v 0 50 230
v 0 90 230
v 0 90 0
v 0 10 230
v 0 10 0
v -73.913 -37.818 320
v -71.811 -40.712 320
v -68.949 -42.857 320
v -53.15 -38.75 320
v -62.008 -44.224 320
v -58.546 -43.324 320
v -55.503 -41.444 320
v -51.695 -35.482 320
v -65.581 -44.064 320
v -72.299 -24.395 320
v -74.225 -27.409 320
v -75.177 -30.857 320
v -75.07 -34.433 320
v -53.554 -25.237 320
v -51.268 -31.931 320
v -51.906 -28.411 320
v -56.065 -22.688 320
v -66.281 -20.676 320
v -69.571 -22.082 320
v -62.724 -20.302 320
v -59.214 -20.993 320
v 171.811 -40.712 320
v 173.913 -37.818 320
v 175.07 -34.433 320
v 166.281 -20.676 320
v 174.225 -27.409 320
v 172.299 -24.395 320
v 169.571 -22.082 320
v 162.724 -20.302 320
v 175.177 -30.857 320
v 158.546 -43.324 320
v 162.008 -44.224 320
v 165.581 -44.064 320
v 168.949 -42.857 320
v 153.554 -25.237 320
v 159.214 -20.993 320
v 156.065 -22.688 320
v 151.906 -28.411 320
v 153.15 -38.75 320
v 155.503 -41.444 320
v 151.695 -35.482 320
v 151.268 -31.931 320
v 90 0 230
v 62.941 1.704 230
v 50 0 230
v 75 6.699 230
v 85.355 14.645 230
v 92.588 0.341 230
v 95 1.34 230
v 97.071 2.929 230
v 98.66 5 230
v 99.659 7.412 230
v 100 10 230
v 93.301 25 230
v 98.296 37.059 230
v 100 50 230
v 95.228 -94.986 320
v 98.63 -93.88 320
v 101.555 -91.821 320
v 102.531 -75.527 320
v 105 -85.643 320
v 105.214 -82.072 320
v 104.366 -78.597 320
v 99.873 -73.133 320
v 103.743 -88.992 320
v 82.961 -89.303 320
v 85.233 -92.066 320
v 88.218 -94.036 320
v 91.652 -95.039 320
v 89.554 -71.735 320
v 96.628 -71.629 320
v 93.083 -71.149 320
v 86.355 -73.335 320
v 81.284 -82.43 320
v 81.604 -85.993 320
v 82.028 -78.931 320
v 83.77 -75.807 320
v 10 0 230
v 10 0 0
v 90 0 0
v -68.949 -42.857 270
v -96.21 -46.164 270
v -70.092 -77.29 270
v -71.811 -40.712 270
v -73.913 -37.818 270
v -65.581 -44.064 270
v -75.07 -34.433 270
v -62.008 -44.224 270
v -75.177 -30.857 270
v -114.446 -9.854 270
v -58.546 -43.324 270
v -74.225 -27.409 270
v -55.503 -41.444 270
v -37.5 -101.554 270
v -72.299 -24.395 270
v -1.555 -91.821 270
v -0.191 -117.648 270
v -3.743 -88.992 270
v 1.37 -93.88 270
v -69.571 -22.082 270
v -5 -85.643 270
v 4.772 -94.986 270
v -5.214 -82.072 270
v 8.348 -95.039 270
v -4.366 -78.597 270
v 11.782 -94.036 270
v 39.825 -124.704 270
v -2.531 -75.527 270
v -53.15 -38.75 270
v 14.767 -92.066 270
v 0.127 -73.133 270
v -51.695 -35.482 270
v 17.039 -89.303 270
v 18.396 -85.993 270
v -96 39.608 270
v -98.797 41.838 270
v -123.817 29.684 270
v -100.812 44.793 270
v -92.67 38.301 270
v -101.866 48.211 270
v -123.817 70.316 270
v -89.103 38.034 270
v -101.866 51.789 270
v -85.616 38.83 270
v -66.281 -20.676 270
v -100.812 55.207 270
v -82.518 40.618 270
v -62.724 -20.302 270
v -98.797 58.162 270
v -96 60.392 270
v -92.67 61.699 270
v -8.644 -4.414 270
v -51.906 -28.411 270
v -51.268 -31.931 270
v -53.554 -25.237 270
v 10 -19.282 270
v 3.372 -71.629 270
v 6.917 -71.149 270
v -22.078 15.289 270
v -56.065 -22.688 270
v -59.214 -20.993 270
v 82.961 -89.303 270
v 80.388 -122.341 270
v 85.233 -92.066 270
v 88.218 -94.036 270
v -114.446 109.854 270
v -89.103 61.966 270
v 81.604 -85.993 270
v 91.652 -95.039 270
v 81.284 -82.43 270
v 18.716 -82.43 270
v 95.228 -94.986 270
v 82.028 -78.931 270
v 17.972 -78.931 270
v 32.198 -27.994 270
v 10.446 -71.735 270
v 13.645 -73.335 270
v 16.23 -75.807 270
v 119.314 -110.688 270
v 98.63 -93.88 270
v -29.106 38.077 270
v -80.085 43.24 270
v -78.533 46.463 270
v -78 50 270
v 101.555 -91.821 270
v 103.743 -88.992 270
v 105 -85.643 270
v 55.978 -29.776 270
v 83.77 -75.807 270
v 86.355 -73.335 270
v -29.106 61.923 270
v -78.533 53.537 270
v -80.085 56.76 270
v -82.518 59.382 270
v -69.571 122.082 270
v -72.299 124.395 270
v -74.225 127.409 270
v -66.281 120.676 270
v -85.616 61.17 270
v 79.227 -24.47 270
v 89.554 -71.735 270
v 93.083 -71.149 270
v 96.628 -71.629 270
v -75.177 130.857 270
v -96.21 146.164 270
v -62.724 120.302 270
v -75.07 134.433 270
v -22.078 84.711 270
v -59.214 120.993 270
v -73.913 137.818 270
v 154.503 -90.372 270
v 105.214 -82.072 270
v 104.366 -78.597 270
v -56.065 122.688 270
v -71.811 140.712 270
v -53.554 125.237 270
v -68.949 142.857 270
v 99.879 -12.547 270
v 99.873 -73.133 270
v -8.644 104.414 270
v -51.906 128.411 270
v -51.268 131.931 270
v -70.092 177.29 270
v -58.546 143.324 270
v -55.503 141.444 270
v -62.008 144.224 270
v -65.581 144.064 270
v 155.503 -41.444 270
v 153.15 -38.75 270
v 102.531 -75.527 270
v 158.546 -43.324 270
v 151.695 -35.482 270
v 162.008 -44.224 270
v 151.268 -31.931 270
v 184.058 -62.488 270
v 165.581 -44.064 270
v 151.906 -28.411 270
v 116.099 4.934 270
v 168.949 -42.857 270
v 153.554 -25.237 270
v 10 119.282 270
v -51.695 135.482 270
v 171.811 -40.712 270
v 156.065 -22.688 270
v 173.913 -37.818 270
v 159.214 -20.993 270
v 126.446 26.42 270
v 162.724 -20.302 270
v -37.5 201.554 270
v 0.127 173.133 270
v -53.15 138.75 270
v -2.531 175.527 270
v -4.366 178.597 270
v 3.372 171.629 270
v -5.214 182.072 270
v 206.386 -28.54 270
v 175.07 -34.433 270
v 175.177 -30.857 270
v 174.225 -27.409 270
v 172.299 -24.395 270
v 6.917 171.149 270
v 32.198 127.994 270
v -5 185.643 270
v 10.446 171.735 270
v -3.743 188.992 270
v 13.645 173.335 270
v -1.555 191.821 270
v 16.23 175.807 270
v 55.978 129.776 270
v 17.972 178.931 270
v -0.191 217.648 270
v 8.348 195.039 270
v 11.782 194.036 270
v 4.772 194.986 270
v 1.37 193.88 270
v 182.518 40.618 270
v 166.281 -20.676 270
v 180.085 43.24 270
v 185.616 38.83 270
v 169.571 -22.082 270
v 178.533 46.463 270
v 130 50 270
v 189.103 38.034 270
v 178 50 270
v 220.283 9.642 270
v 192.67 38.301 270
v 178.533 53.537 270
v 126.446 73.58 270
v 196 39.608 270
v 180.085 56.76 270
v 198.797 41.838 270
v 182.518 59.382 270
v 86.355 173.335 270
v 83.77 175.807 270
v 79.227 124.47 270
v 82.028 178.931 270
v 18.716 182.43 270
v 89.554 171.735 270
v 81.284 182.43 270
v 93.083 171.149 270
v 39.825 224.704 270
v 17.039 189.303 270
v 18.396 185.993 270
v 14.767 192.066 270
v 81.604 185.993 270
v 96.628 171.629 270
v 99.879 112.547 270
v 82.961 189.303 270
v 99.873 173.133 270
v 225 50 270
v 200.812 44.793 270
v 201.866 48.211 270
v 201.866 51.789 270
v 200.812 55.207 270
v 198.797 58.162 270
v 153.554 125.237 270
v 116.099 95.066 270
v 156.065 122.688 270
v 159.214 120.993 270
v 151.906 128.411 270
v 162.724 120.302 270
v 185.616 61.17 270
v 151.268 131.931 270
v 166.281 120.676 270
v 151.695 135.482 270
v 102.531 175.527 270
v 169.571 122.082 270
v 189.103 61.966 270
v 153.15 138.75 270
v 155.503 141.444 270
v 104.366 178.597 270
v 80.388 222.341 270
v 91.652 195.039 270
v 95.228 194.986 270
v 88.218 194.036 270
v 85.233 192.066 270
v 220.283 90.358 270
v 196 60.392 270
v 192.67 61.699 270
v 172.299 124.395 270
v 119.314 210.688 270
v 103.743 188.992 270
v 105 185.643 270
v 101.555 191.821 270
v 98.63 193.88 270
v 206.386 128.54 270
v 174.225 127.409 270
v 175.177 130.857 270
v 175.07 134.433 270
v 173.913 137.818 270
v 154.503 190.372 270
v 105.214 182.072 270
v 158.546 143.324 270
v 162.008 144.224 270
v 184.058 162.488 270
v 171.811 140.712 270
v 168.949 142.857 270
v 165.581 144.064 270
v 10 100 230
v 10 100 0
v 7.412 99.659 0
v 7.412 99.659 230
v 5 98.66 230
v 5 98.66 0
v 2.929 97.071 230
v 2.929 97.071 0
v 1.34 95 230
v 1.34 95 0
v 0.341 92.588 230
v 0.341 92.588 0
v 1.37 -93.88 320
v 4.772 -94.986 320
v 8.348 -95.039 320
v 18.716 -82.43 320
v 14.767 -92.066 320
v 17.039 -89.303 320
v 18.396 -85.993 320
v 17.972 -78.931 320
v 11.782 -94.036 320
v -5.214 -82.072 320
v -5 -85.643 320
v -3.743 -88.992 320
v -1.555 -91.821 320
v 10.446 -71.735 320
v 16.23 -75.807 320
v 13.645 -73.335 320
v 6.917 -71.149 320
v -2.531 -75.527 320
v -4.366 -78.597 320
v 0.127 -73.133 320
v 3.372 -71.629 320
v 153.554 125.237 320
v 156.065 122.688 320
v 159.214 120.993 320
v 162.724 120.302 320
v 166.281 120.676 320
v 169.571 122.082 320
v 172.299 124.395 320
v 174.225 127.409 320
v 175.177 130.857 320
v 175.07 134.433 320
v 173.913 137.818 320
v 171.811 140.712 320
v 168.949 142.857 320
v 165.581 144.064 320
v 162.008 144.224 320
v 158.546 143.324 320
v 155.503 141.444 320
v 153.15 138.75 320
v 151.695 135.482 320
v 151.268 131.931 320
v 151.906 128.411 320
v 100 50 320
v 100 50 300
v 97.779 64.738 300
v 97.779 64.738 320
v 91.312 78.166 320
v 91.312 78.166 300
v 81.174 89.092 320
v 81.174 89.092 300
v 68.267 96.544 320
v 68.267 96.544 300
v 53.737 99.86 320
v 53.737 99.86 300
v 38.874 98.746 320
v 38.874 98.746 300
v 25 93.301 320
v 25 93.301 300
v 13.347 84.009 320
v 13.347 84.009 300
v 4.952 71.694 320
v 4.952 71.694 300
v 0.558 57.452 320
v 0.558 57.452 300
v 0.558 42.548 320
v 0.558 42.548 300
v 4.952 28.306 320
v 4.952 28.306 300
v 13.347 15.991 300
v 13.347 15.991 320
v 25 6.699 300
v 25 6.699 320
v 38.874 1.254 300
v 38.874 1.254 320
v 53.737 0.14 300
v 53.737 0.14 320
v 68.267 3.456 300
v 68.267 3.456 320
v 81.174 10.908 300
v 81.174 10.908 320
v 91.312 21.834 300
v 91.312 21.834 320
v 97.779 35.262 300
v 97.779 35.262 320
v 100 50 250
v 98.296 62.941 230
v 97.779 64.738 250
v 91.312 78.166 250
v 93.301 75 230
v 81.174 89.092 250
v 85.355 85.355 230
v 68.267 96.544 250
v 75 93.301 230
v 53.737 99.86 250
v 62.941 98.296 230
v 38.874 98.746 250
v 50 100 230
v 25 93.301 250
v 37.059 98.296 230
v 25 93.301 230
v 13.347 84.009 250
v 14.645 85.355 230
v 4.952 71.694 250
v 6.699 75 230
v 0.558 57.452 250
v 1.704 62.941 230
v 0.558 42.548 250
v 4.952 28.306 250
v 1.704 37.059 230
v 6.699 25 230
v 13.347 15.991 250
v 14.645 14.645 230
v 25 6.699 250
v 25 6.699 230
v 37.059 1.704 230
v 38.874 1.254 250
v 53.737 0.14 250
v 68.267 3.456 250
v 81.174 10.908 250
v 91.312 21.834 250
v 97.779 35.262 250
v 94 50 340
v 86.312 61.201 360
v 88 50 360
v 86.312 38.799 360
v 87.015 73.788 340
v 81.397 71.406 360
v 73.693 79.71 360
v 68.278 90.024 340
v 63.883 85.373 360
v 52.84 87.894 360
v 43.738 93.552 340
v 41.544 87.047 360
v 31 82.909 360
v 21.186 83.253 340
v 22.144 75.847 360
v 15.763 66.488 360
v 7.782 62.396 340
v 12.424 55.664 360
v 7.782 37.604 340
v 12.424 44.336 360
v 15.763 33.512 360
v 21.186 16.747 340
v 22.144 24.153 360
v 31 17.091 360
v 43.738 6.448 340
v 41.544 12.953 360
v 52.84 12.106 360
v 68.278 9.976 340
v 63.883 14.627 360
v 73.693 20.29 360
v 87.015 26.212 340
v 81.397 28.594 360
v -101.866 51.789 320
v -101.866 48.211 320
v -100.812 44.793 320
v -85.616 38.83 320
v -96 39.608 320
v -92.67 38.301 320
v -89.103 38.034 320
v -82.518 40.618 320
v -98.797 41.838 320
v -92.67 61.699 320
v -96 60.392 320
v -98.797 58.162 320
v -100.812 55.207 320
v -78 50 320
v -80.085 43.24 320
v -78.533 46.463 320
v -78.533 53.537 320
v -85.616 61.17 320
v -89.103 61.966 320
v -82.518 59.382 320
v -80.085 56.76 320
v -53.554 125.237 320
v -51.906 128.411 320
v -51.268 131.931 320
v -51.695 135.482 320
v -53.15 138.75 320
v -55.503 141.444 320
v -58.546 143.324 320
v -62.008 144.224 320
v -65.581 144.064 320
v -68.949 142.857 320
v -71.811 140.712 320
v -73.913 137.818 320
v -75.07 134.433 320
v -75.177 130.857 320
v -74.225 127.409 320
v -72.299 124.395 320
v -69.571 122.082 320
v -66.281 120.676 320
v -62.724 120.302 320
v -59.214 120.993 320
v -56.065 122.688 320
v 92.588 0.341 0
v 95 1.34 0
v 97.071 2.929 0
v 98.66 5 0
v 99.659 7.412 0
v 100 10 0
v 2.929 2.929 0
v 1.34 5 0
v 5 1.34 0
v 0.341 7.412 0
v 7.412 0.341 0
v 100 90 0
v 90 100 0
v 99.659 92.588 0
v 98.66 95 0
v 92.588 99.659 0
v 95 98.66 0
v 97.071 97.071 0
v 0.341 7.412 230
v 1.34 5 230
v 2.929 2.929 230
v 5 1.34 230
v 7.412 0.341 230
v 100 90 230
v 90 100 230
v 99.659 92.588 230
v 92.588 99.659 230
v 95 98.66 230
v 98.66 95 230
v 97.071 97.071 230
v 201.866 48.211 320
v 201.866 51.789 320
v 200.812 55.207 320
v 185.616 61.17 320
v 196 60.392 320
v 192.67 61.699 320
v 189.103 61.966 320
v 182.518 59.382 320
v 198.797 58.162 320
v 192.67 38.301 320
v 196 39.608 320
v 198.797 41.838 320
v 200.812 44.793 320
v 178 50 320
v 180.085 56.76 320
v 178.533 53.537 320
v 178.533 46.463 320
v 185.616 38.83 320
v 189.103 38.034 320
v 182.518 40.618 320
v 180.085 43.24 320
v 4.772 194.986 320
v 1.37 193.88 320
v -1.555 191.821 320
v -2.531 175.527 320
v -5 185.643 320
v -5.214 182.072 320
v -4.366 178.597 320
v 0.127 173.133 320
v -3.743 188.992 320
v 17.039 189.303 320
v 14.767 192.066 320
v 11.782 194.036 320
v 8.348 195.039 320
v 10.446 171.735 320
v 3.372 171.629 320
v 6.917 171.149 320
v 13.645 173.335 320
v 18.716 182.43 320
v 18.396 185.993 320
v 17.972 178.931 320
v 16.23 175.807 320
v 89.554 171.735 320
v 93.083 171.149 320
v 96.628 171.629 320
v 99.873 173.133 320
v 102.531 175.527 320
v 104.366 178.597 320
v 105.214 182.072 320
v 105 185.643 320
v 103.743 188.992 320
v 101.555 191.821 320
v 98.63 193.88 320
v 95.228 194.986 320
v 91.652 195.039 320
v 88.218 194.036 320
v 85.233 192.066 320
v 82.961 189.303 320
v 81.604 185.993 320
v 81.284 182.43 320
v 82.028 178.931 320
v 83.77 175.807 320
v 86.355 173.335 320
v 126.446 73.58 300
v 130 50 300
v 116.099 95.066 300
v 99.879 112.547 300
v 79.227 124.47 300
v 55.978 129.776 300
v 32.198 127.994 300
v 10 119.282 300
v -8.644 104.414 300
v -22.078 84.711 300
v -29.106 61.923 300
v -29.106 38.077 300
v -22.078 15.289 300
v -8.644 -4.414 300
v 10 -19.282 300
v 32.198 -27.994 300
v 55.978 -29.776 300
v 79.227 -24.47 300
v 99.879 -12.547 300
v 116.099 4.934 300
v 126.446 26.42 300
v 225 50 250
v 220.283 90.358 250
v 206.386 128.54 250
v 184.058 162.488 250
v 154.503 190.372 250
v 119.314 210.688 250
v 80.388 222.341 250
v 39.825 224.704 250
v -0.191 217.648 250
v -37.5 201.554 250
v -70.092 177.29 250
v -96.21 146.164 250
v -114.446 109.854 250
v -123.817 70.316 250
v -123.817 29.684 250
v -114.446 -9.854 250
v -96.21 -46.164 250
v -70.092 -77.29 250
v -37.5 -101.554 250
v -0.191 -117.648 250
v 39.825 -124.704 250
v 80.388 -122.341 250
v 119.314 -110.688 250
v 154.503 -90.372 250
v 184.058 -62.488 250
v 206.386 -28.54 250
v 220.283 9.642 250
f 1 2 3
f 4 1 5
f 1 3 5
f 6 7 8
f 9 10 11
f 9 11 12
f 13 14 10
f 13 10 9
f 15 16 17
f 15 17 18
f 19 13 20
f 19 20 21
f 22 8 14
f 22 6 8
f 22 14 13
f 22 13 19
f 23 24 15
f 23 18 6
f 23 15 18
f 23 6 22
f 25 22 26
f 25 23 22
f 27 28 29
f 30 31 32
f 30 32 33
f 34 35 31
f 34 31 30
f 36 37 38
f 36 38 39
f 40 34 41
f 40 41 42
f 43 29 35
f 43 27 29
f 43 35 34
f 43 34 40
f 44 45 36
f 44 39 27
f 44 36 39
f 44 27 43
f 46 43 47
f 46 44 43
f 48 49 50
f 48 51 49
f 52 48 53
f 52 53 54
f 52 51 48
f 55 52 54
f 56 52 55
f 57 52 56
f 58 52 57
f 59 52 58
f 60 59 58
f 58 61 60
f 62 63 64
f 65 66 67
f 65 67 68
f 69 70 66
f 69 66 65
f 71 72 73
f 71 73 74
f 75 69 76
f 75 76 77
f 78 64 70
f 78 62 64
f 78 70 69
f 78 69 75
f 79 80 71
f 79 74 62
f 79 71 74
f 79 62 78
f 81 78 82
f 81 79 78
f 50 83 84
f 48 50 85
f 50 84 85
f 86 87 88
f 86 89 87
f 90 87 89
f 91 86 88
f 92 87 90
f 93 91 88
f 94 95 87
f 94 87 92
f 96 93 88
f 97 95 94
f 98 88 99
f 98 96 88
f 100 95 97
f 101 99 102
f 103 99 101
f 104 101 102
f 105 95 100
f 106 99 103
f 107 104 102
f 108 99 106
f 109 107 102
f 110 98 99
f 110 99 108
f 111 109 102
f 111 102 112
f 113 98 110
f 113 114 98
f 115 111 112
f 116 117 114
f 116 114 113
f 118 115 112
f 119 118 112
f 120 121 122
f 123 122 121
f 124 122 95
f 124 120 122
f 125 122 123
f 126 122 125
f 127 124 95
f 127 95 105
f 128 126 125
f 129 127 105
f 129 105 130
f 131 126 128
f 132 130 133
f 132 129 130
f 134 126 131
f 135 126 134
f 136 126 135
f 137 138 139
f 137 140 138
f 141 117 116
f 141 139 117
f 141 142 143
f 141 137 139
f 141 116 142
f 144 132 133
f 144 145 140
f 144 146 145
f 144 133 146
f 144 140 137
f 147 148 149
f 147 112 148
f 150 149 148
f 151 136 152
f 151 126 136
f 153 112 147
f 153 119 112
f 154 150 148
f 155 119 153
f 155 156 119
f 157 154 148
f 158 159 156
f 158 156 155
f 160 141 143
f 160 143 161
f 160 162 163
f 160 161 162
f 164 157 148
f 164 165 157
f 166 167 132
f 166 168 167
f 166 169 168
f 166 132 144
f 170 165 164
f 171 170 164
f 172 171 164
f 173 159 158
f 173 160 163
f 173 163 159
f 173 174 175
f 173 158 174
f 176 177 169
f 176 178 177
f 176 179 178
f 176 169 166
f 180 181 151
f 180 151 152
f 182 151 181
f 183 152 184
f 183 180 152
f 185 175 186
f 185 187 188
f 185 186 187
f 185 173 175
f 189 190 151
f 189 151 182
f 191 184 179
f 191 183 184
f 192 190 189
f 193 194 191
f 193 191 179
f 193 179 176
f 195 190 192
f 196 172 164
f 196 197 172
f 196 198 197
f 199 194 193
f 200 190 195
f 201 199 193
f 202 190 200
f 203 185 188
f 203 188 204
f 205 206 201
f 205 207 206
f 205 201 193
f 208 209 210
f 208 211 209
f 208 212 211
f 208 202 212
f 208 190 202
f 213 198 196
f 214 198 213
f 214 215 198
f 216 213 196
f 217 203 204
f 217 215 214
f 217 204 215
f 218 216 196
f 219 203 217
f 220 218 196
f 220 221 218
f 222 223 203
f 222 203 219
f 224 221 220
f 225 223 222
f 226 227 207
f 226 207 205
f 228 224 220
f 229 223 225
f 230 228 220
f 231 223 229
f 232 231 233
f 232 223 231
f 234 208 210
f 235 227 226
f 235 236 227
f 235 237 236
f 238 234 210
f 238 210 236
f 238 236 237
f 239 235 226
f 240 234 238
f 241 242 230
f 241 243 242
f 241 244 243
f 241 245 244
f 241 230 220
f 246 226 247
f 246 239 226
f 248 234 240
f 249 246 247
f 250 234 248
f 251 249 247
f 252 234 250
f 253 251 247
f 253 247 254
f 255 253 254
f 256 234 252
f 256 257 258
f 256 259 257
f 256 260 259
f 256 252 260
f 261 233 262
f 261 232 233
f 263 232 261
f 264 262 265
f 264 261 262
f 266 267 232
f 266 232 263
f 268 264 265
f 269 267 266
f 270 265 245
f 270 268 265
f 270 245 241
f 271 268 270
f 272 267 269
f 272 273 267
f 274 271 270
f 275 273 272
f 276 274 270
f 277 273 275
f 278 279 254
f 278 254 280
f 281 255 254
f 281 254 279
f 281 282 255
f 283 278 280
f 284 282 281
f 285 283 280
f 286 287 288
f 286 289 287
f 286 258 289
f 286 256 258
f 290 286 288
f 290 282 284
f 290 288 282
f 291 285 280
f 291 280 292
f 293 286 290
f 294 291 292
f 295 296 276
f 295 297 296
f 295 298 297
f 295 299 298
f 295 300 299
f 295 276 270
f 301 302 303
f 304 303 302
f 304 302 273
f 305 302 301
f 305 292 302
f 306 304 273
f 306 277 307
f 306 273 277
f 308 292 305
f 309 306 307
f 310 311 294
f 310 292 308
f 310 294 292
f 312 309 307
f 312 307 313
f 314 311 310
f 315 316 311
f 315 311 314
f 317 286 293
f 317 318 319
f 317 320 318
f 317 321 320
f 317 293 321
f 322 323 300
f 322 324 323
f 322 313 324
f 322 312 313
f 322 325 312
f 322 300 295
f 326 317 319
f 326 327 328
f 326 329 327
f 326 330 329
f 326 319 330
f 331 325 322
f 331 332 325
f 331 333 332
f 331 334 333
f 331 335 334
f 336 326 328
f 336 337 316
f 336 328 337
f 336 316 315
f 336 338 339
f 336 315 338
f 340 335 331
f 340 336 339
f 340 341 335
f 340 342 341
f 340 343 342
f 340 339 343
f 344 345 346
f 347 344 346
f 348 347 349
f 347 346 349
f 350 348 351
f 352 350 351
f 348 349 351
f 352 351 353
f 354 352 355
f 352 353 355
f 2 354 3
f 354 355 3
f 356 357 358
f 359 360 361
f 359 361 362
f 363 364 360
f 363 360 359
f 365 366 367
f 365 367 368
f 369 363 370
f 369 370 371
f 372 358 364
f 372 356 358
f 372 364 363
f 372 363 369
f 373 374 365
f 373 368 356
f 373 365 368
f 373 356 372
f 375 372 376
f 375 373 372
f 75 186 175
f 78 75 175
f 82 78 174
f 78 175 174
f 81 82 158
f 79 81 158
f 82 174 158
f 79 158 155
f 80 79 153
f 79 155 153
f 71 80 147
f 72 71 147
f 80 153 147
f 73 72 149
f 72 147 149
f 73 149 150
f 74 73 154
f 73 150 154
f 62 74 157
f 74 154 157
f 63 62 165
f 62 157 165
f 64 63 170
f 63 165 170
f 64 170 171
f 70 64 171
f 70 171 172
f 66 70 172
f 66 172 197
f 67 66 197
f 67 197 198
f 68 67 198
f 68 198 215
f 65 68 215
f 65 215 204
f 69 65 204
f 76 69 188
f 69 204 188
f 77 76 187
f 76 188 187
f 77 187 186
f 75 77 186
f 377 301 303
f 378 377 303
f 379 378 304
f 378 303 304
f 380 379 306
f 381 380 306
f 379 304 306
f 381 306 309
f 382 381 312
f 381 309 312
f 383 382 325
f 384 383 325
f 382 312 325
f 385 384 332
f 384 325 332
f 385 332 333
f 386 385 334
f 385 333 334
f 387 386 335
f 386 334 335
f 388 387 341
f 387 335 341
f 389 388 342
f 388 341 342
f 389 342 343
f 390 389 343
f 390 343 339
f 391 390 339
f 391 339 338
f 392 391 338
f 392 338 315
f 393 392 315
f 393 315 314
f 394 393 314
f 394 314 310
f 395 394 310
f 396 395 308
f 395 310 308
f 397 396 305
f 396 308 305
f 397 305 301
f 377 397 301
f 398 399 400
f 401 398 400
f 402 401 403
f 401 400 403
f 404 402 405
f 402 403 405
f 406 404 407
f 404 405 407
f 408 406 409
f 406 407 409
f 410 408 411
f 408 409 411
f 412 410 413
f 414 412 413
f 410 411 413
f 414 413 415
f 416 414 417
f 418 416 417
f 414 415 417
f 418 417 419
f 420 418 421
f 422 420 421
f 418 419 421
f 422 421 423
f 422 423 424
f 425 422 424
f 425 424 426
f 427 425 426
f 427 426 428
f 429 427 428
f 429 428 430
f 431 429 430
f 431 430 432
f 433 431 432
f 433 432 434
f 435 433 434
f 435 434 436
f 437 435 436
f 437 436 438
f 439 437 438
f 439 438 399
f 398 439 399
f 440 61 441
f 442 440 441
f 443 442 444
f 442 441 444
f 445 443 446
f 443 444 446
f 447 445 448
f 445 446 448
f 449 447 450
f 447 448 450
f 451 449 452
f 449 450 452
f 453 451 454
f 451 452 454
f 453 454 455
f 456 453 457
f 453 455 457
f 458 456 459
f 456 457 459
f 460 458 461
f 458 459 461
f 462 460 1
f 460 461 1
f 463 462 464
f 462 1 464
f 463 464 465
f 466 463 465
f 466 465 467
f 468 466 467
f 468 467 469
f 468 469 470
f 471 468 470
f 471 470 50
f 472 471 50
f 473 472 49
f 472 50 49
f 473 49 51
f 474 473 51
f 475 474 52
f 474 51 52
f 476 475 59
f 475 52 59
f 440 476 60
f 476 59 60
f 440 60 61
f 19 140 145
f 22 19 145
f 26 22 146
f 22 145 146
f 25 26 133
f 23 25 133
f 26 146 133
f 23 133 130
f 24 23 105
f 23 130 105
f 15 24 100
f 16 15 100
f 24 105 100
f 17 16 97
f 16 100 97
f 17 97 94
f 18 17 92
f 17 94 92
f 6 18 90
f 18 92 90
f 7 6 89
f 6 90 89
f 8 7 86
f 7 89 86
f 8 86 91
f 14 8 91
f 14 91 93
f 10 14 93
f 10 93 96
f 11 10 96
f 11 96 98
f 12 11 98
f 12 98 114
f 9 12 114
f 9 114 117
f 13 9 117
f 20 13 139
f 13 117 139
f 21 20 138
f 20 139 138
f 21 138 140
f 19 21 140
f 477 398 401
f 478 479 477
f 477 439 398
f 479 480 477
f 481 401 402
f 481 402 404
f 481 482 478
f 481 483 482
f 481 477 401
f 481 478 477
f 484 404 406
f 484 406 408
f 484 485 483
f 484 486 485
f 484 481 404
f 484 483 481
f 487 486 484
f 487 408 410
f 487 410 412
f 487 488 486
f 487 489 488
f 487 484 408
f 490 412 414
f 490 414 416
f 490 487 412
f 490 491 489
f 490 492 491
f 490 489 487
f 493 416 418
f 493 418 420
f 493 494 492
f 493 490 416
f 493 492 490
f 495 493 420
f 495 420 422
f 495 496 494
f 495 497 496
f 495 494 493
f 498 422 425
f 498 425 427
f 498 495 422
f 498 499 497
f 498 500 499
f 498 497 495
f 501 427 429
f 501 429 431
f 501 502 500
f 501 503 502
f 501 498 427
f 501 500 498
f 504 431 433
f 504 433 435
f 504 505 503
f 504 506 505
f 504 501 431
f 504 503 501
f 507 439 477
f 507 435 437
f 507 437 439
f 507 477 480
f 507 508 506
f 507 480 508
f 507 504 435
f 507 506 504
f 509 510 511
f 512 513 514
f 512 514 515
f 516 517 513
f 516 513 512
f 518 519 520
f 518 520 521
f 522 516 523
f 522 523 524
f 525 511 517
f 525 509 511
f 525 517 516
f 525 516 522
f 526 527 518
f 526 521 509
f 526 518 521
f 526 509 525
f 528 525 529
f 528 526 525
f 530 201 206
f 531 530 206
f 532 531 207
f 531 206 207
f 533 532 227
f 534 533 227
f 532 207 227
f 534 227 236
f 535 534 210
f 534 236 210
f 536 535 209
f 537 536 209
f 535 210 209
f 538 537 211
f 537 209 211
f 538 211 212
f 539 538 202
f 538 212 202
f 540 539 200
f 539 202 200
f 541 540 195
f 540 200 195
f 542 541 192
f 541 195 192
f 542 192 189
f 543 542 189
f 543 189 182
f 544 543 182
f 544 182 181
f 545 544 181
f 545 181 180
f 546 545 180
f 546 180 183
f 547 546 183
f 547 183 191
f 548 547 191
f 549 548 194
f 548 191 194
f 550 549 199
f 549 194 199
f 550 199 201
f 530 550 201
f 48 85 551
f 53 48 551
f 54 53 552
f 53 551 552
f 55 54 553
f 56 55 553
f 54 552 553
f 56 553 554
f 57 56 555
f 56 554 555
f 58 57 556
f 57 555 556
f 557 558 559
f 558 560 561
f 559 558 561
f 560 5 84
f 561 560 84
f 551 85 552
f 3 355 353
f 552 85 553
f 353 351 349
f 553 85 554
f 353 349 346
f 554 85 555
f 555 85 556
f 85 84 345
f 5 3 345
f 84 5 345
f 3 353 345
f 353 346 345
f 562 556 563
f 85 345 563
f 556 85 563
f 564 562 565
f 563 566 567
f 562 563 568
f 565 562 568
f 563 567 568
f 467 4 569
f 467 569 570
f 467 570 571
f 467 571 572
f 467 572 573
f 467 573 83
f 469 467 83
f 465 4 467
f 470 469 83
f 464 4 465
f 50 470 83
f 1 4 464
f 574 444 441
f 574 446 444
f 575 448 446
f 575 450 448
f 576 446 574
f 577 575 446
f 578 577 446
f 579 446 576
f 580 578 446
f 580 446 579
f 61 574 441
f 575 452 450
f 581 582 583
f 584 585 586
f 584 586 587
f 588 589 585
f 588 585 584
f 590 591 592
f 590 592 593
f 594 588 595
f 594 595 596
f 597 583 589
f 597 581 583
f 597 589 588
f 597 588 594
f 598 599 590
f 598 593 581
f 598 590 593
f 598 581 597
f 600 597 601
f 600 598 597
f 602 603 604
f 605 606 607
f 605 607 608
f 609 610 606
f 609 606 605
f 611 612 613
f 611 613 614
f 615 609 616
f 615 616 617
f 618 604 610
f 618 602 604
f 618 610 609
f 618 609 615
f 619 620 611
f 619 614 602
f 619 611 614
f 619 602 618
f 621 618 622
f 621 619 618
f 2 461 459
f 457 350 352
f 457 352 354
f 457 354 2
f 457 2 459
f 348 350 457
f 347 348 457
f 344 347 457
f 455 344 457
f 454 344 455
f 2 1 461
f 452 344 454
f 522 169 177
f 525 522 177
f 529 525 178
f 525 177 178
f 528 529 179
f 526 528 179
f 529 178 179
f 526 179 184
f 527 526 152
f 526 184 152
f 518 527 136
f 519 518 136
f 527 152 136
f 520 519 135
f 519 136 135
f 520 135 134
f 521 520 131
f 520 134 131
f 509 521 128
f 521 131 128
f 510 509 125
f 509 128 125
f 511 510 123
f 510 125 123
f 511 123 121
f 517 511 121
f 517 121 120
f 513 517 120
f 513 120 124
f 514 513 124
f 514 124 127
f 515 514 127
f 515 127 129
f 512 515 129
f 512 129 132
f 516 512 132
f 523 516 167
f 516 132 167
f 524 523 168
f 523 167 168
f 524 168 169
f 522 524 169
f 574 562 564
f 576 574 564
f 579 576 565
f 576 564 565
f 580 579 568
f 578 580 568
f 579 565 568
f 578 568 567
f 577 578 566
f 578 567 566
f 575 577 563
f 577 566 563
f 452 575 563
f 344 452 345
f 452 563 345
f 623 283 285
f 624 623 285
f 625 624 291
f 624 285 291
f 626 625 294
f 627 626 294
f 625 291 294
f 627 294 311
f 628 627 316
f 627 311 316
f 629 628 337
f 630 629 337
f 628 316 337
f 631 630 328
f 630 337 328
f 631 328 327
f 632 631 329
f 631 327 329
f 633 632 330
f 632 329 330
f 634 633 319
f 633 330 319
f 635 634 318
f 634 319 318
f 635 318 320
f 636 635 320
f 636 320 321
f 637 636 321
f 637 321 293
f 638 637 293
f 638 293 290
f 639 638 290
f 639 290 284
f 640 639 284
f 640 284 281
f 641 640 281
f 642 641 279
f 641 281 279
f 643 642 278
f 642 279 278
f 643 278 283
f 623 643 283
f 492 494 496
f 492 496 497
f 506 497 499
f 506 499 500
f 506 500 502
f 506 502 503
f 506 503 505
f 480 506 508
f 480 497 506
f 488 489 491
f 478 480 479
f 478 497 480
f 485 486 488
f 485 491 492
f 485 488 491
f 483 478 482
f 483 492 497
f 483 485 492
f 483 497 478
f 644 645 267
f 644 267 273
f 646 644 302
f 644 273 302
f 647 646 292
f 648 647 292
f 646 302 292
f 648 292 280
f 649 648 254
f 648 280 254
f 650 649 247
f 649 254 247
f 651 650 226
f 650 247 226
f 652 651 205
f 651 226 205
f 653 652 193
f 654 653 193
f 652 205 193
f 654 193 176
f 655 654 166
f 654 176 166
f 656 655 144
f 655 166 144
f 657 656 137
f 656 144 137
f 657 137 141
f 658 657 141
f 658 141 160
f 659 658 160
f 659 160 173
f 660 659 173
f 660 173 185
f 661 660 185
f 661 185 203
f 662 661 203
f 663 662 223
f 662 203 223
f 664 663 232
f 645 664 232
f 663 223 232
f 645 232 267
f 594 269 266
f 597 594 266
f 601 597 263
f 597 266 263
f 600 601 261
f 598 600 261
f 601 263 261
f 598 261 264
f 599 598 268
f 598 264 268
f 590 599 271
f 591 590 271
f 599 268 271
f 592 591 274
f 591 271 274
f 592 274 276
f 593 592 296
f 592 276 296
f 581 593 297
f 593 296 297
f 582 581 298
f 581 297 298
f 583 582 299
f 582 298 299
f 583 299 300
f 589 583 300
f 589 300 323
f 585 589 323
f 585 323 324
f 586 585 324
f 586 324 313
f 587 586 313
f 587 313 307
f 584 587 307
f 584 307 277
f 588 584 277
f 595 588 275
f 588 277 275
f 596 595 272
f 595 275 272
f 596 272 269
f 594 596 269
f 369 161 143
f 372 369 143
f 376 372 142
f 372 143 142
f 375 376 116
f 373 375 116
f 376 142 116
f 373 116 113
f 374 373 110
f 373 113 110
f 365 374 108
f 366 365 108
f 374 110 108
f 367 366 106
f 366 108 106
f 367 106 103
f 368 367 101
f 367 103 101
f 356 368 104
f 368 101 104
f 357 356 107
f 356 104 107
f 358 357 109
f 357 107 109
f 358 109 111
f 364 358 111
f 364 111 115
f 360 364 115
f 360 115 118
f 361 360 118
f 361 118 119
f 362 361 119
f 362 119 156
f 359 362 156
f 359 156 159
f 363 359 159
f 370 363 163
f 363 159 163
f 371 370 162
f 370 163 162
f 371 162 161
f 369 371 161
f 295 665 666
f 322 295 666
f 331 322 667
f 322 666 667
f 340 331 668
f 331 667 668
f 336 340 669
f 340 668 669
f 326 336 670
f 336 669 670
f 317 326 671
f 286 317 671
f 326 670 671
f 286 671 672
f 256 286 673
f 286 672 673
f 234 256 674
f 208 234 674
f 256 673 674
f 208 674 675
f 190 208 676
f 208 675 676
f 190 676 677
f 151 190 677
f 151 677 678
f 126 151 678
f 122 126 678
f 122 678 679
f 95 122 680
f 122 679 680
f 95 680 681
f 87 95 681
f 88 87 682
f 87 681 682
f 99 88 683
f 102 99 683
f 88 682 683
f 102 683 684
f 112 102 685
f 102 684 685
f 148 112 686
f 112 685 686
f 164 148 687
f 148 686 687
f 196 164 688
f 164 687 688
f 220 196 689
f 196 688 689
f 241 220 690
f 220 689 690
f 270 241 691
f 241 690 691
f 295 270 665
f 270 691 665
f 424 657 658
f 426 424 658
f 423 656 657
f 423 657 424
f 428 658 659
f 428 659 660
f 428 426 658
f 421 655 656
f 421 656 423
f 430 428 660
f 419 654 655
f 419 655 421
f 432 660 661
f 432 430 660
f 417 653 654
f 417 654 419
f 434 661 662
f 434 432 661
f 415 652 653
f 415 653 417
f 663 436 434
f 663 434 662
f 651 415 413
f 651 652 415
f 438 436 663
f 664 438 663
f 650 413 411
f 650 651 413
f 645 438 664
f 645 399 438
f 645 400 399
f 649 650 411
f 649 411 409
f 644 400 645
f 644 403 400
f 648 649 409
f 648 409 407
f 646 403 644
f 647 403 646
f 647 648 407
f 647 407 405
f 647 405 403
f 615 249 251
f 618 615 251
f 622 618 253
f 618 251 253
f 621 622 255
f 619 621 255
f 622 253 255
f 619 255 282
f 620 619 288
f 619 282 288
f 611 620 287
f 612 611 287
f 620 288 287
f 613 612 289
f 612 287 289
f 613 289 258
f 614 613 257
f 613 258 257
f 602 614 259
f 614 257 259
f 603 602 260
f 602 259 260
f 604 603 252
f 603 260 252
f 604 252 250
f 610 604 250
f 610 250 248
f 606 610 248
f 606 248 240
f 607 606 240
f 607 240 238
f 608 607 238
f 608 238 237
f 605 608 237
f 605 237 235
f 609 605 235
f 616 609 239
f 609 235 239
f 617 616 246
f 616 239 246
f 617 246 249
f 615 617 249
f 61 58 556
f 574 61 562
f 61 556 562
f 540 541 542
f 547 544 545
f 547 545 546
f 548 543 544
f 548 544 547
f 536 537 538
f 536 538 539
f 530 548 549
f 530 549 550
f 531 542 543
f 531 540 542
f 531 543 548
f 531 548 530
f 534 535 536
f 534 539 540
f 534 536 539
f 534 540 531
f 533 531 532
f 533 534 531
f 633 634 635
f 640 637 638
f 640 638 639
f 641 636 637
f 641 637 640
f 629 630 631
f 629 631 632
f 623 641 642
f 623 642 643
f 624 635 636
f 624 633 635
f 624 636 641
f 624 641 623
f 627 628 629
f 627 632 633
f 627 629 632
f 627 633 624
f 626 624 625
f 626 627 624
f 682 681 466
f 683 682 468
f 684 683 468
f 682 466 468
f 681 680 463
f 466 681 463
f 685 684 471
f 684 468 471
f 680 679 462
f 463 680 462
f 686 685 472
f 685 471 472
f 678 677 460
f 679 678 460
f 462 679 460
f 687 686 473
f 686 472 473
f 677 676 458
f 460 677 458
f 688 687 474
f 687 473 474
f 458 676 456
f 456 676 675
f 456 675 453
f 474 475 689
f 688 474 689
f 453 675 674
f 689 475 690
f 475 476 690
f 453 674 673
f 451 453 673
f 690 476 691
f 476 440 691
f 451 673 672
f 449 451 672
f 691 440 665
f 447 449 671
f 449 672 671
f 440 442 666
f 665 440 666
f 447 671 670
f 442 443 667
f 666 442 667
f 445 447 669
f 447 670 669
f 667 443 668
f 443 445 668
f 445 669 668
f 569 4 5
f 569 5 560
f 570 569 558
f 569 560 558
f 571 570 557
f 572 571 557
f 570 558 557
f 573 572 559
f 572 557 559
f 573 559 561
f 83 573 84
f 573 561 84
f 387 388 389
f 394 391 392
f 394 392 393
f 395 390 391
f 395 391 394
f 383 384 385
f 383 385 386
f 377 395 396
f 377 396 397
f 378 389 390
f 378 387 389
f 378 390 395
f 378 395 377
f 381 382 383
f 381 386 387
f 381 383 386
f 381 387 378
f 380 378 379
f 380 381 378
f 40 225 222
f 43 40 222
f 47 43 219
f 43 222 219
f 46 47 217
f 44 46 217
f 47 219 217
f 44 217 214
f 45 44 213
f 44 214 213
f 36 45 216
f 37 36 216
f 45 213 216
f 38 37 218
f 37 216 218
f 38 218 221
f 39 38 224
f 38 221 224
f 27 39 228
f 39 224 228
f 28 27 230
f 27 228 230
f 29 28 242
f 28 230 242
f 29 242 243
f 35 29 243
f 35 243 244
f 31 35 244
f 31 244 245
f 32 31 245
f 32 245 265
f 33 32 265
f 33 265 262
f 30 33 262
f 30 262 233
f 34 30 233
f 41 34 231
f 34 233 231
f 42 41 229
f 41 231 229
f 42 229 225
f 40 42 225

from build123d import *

# Parameters (mm, degrees)
EXTRUDE1_DEPTH    = 230
SKETCH2_R         = 50
EXTRUDE4_DEPTH    = 20
SKETCH5_R         = 175
EXTRUDE5_DEPTH    = 20
SKETCH6_R         = 50
EXTRUDE6_DEPTH    = 90
CHAMFER2_SIZE     = 40
CHAMFER2_SIZE2    = 12
SKETCH7_R         = 80
EXTRUDE7_DEPTH    = 30
SKETCH8_R         = 12
EXTRUDE8_DEPTH    = 50
CIRPATTERN1_COUNT = 10


with BuildPart() as part:
    # Sketch1 → Extrude1 (new body)
    with BuildSketch(Plane.XY):
        with BuildLine():
            Line((10, 0), (90, 0))
            ThreePointArc((90, 0), (97.071067812, 2.928932188), (100, 10))
            Line((100, 10), (100, 90))
            ThreePointArc((100, 90), (97.071067812, 97.071067812), (90, 100))
            Line((90, 100), (10, 100))
            ThreePointArc((10, 100), (2.928932188, 97.071067812), (0, 90))
            Line((0, 90), (0, 10))
            ThreePointArc((0, 10), (2.928932188, 2.928932188), (10, 0))
        make_face()
    extrude(amount=EXTRUDE1_DEPTH)

    # Sketch2 → Extrude4 (add)
    with BuildSketch(Plane.XY.offset(230)):
        with Locations((50, 50)):
            Circle(SKETCH2_R)
    extrude(amount=EXTRUDE4_DEPTH)

    # Sketch5 → Extrude5 (add)
    with BuildSketch(Plane.XY.offset(250)):
        with Locations((50, 50)):
            Circle(SKETCH5_R)
    extrude(amount=EXTRUDE5_DEPTH)

    # Sketch6 → Extrude6 (add)
    with BuildSketch(Plane.XY.offset(270)):
        with Locations((50, 50)):
            Circle(SKETCH6_R)
    extrude(amount=EXTRUDE6_DEPTH)

    # Chamfer2
    chamfer2_edges = [part.edges().sort_by_distance(p)[0] for p in [
        (0, 50, 360),
    ]]
    chamfer2_side = [part.faces().sort_by_distance(p)[0] for p in [
        (0, 50, 315),
    ]]
    chamfer(chamfer2_edges, length=CHAMFER2_SIZE, length2=CHAMFER2_SIZE2, reference=chamfer2_side[0])

    # Sketch7 → Extrude7 (add)
    with BuildSketch(Plane.XY.offset(270)):
        with Locations((50, 50)):
            Circle(SKETCH7_R)
    extrude(amount=EXTRUDE7_DEPTH)

    # Sketch8 → Extrude8 (add)
    with BuildSketch(Plane.XY.offset(270)):
        with Locations((-90, 50)):
            Circle(SKETCH8_R)
    extrude8 = extrude(amount=EXTRUDE8_DEPTH)

    # CirPattern1: Extrude8 ×10 about axis
    cirpattern1_axis = Axis((50, 50, 320), (0, 0, 1))
    for i in range(1, CIRPATTERN1_COUNT):
        add(extrude8.rotate(cirpattern1_axis, i * 360 / CIRPATTERN1_COUNT))


solid = part.part
